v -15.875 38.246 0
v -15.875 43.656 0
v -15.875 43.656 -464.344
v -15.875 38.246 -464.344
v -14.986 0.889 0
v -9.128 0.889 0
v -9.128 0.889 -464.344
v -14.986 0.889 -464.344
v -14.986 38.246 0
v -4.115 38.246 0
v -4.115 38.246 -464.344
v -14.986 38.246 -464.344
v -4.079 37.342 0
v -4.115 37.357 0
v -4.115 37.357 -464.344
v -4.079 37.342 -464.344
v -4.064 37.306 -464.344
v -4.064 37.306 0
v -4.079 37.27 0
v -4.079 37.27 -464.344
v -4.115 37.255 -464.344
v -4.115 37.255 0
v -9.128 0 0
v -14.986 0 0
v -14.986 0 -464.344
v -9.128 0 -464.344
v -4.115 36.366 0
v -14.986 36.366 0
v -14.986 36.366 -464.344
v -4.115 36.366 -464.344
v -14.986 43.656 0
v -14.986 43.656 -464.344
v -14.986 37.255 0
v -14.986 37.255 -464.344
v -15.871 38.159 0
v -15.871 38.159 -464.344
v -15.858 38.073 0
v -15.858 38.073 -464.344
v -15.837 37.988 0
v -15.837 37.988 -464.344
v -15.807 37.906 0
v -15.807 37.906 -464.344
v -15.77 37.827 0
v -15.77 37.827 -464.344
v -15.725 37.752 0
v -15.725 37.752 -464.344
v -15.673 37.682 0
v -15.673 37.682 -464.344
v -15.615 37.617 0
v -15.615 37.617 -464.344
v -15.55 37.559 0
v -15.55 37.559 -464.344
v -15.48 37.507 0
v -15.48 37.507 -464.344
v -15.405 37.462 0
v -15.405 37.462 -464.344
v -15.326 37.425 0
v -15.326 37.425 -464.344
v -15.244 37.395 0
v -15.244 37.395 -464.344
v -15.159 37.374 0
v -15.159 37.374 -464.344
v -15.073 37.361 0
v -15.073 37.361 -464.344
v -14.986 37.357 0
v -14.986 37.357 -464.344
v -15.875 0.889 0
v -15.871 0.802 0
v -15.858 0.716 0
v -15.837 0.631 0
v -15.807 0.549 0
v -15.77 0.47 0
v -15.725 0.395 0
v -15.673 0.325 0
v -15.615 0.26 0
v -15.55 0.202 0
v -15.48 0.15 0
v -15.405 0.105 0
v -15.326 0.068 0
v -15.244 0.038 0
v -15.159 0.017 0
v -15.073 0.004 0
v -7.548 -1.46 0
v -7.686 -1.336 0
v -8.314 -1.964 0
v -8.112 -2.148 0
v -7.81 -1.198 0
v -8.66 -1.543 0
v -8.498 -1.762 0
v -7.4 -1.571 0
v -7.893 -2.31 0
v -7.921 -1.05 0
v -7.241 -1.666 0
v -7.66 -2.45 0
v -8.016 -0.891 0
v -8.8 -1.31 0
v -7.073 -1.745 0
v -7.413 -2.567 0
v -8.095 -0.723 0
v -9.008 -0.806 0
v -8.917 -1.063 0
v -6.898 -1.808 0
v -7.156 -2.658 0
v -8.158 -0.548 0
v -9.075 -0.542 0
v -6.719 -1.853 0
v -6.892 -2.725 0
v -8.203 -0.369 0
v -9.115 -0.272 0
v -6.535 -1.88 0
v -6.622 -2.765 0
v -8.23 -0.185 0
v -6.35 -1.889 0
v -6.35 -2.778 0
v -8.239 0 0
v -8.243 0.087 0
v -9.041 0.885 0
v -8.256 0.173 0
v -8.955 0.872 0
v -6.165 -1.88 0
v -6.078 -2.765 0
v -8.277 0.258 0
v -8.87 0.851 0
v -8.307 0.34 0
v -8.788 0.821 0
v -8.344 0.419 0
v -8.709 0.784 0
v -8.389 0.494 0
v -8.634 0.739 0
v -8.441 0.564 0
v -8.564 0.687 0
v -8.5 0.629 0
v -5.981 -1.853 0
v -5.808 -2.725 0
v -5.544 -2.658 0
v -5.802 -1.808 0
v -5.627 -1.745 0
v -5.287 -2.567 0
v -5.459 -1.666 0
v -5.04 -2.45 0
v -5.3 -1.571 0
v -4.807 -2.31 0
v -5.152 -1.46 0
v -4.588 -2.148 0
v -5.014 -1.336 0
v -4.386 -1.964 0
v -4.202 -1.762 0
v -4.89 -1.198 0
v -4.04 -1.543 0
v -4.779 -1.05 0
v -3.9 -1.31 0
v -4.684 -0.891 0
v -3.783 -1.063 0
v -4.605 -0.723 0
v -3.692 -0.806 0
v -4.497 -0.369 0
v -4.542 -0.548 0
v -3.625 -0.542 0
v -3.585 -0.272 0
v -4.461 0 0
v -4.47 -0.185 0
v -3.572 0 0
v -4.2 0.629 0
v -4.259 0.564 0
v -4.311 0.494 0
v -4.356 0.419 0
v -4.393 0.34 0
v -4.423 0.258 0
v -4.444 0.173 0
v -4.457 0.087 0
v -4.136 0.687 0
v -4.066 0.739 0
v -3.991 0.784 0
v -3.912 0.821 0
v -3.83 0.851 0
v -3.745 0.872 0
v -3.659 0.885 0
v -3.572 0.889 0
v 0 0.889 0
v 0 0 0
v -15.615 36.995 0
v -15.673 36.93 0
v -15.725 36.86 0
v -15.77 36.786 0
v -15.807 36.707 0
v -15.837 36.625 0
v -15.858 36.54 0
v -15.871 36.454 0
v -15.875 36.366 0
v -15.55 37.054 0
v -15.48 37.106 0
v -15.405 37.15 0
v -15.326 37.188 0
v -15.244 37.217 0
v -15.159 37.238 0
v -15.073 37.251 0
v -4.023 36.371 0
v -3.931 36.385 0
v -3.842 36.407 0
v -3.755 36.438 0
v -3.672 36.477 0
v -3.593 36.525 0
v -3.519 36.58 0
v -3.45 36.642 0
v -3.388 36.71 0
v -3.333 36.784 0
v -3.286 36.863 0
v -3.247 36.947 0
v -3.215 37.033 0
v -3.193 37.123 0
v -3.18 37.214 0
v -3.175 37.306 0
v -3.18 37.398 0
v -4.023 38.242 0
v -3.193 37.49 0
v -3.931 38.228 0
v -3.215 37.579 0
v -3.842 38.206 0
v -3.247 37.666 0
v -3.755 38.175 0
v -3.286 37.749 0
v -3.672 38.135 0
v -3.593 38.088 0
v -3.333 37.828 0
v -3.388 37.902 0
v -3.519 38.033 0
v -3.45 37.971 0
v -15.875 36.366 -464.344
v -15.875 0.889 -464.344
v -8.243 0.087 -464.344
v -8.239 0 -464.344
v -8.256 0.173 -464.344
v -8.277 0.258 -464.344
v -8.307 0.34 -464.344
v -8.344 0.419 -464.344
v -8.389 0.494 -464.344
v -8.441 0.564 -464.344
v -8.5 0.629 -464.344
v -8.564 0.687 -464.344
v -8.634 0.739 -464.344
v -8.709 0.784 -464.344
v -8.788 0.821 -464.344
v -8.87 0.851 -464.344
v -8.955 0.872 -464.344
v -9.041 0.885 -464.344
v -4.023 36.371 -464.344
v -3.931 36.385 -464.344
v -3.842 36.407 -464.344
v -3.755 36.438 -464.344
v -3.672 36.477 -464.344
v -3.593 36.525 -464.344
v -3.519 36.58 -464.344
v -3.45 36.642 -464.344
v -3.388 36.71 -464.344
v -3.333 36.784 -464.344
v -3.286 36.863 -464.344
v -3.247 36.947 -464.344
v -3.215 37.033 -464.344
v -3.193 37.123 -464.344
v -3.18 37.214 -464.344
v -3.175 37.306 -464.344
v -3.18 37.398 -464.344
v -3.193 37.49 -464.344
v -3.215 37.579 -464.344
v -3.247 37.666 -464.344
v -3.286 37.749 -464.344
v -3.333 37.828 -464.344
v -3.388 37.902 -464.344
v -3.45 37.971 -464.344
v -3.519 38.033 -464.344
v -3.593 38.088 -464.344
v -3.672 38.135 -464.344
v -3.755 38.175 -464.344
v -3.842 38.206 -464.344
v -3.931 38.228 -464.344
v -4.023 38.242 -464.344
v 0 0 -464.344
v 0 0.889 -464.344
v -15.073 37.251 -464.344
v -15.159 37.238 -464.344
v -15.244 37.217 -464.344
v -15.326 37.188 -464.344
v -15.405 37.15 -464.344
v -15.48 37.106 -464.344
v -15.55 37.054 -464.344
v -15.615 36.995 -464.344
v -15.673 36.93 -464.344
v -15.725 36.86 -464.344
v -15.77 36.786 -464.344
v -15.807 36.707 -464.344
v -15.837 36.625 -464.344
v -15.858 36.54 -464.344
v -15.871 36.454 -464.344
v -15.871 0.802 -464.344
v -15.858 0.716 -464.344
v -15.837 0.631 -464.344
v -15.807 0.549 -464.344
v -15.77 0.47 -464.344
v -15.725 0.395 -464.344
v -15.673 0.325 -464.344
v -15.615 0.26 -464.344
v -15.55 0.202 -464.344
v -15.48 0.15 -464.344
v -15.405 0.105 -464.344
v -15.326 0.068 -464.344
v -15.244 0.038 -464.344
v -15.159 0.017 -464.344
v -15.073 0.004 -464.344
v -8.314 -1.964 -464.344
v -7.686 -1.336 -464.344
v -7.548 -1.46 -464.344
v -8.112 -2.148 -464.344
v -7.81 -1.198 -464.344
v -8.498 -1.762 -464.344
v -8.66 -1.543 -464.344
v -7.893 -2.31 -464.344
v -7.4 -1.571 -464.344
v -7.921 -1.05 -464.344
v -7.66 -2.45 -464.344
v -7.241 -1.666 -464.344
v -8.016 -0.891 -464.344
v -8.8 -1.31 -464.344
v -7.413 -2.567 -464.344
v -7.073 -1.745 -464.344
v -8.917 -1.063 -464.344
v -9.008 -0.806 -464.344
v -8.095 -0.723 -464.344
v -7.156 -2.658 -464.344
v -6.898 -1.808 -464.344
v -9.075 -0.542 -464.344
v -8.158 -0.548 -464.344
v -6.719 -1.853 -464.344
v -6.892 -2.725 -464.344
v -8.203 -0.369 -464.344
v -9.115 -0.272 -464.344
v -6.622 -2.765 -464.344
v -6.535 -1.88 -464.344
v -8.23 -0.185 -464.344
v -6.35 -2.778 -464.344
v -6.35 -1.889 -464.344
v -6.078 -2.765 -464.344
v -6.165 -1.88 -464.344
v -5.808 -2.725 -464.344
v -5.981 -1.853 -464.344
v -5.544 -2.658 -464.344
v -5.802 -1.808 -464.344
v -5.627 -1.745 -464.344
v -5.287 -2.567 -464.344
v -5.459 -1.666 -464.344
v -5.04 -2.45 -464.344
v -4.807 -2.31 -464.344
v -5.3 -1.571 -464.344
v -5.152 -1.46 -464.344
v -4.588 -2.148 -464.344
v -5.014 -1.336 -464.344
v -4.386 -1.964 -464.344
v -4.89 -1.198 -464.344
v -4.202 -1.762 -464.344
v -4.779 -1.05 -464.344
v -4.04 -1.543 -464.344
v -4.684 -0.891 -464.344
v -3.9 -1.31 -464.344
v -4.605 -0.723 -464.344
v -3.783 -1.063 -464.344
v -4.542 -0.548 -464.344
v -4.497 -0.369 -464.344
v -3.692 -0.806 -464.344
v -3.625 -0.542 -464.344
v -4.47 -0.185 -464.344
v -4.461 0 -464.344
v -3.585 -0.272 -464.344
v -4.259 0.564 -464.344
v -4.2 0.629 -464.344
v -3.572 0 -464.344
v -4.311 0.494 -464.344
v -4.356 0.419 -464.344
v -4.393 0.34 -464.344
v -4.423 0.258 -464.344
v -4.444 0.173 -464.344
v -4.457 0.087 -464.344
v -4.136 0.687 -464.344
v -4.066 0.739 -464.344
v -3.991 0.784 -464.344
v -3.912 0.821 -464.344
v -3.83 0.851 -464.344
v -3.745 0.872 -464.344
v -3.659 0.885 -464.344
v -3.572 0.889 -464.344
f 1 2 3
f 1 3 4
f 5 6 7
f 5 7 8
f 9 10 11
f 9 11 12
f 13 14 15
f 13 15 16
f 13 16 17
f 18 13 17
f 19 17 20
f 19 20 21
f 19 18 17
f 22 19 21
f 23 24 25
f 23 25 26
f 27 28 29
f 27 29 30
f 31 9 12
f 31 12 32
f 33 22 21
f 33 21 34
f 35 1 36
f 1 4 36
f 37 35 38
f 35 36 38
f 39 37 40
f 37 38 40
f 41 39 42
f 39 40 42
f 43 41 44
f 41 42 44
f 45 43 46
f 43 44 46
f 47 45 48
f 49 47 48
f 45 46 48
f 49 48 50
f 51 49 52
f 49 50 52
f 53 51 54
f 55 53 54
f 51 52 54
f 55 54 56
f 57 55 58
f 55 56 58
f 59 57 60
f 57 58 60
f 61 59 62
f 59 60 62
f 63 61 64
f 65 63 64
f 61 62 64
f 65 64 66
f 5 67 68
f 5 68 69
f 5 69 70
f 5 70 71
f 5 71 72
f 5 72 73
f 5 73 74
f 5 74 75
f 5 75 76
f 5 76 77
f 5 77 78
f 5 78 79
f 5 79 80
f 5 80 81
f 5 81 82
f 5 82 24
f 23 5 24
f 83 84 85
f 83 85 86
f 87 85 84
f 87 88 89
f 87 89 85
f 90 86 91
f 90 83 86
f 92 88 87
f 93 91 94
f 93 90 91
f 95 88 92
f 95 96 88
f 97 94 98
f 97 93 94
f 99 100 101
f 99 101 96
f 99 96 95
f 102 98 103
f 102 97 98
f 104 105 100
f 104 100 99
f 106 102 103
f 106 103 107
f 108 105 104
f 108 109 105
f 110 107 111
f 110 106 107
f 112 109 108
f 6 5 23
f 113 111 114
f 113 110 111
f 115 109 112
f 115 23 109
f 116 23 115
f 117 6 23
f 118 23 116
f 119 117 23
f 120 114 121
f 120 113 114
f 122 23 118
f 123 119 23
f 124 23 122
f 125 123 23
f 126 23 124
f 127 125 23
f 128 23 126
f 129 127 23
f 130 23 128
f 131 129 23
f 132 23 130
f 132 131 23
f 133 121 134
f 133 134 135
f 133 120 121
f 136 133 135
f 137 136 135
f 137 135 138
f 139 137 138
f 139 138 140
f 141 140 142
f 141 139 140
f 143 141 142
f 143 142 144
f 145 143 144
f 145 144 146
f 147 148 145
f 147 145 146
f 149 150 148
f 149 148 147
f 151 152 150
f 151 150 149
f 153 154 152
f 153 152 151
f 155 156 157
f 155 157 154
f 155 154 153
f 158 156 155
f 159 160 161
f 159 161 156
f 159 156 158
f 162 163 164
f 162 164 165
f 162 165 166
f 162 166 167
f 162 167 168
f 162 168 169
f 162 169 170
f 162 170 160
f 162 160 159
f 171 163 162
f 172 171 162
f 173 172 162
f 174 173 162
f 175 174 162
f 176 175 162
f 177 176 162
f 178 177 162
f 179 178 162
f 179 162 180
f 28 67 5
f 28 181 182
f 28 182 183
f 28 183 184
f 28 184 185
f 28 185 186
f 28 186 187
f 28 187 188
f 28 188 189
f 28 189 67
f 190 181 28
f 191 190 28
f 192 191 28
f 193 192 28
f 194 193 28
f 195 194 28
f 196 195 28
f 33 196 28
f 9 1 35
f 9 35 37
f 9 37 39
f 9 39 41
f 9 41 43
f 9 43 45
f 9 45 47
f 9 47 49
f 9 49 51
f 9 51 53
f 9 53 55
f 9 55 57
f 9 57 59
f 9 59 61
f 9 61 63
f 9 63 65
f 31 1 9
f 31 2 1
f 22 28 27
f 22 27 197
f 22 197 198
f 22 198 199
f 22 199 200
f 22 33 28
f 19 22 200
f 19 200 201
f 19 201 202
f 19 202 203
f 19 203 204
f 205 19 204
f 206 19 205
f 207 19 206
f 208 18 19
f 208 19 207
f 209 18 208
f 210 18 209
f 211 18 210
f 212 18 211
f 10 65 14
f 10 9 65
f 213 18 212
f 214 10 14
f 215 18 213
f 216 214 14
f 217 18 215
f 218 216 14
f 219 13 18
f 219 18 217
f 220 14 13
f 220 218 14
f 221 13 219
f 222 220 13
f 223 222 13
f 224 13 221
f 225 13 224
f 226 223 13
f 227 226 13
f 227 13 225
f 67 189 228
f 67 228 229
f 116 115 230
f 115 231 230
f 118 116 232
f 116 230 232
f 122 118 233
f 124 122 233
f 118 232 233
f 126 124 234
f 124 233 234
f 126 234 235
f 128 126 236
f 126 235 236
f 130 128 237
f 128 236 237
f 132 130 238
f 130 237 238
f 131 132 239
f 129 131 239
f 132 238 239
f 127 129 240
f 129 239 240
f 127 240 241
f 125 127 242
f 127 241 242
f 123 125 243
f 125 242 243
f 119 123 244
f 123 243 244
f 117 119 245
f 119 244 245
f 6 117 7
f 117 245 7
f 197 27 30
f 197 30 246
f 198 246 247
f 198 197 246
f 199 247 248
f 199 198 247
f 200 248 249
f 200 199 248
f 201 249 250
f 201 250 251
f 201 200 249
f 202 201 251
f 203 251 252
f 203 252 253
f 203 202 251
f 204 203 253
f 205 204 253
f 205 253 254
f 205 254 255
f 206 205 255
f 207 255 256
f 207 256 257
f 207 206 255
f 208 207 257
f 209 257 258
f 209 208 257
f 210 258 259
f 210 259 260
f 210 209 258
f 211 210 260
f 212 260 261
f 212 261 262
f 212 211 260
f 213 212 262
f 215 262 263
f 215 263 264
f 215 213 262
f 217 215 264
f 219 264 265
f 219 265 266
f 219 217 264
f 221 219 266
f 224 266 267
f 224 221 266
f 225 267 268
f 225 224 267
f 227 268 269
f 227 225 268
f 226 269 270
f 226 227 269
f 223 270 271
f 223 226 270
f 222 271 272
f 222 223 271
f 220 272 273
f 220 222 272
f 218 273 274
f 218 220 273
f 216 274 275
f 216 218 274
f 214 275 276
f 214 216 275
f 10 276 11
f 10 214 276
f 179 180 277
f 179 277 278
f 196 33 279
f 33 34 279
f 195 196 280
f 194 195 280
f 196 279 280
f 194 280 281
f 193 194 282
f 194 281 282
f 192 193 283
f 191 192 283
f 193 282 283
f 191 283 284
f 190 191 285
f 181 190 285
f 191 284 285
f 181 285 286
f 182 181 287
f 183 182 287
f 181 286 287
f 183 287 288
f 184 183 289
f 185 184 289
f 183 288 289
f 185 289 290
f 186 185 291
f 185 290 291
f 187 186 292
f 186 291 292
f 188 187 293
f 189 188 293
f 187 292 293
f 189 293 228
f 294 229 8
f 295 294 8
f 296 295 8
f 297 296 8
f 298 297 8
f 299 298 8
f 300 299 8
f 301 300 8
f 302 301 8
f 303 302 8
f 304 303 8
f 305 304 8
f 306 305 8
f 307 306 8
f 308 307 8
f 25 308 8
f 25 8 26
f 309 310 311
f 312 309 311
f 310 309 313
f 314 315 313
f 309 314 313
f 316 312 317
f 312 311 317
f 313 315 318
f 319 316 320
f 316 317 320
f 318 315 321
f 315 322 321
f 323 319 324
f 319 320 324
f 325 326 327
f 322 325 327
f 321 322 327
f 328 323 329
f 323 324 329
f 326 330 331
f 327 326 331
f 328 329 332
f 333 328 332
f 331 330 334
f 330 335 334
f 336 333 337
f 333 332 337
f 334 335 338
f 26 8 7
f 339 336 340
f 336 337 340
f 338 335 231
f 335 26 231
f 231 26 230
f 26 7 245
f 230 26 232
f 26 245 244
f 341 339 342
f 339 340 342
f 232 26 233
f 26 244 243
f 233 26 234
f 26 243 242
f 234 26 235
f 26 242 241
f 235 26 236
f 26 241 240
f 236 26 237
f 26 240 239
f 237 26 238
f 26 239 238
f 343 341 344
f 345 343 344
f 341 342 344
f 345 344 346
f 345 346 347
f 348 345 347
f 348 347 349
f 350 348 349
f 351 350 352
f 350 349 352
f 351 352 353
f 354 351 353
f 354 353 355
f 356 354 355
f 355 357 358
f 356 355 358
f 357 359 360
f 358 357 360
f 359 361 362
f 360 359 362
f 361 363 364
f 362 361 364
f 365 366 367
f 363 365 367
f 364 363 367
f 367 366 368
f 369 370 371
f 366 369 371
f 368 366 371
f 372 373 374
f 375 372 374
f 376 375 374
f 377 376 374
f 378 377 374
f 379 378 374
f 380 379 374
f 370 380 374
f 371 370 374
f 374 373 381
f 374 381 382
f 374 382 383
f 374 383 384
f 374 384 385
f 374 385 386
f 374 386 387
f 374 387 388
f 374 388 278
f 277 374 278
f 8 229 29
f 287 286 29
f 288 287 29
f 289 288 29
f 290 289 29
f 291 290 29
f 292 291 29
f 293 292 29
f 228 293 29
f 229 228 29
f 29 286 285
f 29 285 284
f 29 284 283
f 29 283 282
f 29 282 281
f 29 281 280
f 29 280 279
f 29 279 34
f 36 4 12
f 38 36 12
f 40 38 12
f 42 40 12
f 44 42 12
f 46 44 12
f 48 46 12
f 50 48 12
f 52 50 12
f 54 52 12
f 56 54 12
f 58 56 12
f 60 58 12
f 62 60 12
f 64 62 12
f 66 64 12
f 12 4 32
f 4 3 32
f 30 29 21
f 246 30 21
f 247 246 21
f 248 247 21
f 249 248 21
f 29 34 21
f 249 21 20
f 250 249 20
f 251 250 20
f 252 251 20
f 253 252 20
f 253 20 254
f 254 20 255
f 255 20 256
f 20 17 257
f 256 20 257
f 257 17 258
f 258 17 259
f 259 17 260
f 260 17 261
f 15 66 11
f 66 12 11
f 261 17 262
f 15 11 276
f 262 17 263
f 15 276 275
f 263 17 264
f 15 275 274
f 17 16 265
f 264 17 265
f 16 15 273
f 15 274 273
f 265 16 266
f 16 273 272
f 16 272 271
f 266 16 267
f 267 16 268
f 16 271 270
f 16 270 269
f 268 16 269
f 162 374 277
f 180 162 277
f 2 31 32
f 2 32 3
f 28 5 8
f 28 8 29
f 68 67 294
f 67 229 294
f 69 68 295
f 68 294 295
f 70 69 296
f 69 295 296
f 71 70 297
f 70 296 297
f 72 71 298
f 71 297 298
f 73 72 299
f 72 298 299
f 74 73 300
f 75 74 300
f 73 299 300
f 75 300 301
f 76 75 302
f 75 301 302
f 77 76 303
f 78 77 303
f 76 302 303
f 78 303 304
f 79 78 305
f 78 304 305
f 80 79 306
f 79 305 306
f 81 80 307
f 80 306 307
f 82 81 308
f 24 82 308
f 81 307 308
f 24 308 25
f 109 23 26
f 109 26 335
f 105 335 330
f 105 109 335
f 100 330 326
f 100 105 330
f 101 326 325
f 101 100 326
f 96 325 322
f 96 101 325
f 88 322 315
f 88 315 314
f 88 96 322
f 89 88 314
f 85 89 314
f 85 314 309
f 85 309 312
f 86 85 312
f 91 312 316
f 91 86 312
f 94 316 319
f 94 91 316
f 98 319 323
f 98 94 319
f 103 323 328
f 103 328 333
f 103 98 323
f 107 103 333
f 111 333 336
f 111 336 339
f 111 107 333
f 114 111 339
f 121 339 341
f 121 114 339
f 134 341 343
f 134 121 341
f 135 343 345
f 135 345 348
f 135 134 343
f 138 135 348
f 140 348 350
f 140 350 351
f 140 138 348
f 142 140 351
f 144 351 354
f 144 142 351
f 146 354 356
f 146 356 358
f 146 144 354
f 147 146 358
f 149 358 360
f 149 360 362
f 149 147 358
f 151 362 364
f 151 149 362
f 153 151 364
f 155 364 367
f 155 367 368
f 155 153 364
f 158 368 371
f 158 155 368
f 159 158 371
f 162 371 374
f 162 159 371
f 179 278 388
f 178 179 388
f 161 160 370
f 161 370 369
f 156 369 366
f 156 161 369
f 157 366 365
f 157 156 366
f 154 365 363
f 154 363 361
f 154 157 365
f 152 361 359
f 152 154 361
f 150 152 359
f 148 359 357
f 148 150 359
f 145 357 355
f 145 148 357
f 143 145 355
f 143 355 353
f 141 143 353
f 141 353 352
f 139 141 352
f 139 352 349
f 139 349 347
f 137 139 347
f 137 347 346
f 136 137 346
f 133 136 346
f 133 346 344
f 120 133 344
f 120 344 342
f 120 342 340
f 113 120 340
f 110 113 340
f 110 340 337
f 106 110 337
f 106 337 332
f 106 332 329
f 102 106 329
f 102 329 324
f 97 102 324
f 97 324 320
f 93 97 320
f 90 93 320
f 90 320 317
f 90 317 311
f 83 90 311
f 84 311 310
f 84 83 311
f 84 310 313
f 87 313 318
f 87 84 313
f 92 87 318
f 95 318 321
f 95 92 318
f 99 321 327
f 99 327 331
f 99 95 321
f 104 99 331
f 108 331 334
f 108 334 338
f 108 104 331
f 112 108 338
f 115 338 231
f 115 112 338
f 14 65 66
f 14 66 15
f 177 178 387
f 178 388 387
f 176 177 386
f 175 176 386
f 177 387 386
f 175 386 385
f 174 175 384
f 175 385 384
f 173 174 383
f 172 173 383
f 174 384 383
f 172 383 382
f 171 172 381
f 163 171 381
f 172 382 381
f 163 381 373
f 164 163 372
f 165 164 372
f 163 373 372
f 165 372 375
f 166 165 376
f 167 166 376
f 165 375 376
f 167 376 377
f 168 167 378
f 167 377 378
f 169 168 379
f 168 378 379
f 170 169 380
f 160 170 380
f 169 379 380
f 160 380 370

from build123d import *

# Parameters (mm, degrees)
EXTRUDE_THIN1_DEPTH = 464.34375
FILLET1_R           = 0.889


with BuildPart() as part:
    # Sketch1 → Extrude-Thin1 (new body)
    with BuildSketch(Plane.XY):
        with BuildLine():
            Line((-15.875, 43.65625), (-15.875, 37.35705))
            Line((-15.875, 37.35705), (-4.1148, 37.35705))
            ThreePointArc((-4.1148, 37.35705), (-4.064, 37.30625), (-4.1148, 37.25545))
            Line((-4.1148, 37.25545), (-15.875, 37.25545))
            Line((-15.875, 37.25545), (-15.875, 0))
            Line((-15.875, 0), (-9.128125, 0))
            ThreePointArc((-9.128125, 0), (-6.35, -2.778125), (-3.571875, 0))
            Line((-3.571875, 0), (0, 0))
            Line((0, 0), (0, 0.889))
            Line((0, 0.889), (-4.683125, 0.889))
            ThreePointArc((-4.683125, 0.889), (-6.35, -1.889125), (-8.016875, 0.889))
            Line((-8.016875, 0.889), (-14.986, 0.889))
            Line((-14.986, 0.889), (-14.986, 36.36645))
            Line((-14.986, 36.36645), (-4.1148, 36.36645))
            ThreePointArc((-4.1148, 36.36645), (-3.175, 37.30625), (-4.1148, 38.24605))
            Line((-4.1148, 38.24605), (-14.986, 38.24605))
            Line((-14.986, 38.24605), (-14.986, 43.65625))
            Line((-14.986, 43.65625), (-15.875, 43.65625))
        make_face()
    extrude(amount=-EXTRUDE_THIN1_DEPTH)

    # Fillet1
    fillet1_edges = [part.edges().sort_by_distance(p)[0] for p in [
        (-15.875, 0, -232.171875),
        (-15.875, 37.25545, -232.171875),
        (-15.875, 37.35705, -232.171875),
        (-8.016875, 0.889, -232.171875),
        (-4.683125, 0.889, -232.171875),
    ]]
    fillet(fillet1_edges, radius=FILLET1_R)


solid = part.part
